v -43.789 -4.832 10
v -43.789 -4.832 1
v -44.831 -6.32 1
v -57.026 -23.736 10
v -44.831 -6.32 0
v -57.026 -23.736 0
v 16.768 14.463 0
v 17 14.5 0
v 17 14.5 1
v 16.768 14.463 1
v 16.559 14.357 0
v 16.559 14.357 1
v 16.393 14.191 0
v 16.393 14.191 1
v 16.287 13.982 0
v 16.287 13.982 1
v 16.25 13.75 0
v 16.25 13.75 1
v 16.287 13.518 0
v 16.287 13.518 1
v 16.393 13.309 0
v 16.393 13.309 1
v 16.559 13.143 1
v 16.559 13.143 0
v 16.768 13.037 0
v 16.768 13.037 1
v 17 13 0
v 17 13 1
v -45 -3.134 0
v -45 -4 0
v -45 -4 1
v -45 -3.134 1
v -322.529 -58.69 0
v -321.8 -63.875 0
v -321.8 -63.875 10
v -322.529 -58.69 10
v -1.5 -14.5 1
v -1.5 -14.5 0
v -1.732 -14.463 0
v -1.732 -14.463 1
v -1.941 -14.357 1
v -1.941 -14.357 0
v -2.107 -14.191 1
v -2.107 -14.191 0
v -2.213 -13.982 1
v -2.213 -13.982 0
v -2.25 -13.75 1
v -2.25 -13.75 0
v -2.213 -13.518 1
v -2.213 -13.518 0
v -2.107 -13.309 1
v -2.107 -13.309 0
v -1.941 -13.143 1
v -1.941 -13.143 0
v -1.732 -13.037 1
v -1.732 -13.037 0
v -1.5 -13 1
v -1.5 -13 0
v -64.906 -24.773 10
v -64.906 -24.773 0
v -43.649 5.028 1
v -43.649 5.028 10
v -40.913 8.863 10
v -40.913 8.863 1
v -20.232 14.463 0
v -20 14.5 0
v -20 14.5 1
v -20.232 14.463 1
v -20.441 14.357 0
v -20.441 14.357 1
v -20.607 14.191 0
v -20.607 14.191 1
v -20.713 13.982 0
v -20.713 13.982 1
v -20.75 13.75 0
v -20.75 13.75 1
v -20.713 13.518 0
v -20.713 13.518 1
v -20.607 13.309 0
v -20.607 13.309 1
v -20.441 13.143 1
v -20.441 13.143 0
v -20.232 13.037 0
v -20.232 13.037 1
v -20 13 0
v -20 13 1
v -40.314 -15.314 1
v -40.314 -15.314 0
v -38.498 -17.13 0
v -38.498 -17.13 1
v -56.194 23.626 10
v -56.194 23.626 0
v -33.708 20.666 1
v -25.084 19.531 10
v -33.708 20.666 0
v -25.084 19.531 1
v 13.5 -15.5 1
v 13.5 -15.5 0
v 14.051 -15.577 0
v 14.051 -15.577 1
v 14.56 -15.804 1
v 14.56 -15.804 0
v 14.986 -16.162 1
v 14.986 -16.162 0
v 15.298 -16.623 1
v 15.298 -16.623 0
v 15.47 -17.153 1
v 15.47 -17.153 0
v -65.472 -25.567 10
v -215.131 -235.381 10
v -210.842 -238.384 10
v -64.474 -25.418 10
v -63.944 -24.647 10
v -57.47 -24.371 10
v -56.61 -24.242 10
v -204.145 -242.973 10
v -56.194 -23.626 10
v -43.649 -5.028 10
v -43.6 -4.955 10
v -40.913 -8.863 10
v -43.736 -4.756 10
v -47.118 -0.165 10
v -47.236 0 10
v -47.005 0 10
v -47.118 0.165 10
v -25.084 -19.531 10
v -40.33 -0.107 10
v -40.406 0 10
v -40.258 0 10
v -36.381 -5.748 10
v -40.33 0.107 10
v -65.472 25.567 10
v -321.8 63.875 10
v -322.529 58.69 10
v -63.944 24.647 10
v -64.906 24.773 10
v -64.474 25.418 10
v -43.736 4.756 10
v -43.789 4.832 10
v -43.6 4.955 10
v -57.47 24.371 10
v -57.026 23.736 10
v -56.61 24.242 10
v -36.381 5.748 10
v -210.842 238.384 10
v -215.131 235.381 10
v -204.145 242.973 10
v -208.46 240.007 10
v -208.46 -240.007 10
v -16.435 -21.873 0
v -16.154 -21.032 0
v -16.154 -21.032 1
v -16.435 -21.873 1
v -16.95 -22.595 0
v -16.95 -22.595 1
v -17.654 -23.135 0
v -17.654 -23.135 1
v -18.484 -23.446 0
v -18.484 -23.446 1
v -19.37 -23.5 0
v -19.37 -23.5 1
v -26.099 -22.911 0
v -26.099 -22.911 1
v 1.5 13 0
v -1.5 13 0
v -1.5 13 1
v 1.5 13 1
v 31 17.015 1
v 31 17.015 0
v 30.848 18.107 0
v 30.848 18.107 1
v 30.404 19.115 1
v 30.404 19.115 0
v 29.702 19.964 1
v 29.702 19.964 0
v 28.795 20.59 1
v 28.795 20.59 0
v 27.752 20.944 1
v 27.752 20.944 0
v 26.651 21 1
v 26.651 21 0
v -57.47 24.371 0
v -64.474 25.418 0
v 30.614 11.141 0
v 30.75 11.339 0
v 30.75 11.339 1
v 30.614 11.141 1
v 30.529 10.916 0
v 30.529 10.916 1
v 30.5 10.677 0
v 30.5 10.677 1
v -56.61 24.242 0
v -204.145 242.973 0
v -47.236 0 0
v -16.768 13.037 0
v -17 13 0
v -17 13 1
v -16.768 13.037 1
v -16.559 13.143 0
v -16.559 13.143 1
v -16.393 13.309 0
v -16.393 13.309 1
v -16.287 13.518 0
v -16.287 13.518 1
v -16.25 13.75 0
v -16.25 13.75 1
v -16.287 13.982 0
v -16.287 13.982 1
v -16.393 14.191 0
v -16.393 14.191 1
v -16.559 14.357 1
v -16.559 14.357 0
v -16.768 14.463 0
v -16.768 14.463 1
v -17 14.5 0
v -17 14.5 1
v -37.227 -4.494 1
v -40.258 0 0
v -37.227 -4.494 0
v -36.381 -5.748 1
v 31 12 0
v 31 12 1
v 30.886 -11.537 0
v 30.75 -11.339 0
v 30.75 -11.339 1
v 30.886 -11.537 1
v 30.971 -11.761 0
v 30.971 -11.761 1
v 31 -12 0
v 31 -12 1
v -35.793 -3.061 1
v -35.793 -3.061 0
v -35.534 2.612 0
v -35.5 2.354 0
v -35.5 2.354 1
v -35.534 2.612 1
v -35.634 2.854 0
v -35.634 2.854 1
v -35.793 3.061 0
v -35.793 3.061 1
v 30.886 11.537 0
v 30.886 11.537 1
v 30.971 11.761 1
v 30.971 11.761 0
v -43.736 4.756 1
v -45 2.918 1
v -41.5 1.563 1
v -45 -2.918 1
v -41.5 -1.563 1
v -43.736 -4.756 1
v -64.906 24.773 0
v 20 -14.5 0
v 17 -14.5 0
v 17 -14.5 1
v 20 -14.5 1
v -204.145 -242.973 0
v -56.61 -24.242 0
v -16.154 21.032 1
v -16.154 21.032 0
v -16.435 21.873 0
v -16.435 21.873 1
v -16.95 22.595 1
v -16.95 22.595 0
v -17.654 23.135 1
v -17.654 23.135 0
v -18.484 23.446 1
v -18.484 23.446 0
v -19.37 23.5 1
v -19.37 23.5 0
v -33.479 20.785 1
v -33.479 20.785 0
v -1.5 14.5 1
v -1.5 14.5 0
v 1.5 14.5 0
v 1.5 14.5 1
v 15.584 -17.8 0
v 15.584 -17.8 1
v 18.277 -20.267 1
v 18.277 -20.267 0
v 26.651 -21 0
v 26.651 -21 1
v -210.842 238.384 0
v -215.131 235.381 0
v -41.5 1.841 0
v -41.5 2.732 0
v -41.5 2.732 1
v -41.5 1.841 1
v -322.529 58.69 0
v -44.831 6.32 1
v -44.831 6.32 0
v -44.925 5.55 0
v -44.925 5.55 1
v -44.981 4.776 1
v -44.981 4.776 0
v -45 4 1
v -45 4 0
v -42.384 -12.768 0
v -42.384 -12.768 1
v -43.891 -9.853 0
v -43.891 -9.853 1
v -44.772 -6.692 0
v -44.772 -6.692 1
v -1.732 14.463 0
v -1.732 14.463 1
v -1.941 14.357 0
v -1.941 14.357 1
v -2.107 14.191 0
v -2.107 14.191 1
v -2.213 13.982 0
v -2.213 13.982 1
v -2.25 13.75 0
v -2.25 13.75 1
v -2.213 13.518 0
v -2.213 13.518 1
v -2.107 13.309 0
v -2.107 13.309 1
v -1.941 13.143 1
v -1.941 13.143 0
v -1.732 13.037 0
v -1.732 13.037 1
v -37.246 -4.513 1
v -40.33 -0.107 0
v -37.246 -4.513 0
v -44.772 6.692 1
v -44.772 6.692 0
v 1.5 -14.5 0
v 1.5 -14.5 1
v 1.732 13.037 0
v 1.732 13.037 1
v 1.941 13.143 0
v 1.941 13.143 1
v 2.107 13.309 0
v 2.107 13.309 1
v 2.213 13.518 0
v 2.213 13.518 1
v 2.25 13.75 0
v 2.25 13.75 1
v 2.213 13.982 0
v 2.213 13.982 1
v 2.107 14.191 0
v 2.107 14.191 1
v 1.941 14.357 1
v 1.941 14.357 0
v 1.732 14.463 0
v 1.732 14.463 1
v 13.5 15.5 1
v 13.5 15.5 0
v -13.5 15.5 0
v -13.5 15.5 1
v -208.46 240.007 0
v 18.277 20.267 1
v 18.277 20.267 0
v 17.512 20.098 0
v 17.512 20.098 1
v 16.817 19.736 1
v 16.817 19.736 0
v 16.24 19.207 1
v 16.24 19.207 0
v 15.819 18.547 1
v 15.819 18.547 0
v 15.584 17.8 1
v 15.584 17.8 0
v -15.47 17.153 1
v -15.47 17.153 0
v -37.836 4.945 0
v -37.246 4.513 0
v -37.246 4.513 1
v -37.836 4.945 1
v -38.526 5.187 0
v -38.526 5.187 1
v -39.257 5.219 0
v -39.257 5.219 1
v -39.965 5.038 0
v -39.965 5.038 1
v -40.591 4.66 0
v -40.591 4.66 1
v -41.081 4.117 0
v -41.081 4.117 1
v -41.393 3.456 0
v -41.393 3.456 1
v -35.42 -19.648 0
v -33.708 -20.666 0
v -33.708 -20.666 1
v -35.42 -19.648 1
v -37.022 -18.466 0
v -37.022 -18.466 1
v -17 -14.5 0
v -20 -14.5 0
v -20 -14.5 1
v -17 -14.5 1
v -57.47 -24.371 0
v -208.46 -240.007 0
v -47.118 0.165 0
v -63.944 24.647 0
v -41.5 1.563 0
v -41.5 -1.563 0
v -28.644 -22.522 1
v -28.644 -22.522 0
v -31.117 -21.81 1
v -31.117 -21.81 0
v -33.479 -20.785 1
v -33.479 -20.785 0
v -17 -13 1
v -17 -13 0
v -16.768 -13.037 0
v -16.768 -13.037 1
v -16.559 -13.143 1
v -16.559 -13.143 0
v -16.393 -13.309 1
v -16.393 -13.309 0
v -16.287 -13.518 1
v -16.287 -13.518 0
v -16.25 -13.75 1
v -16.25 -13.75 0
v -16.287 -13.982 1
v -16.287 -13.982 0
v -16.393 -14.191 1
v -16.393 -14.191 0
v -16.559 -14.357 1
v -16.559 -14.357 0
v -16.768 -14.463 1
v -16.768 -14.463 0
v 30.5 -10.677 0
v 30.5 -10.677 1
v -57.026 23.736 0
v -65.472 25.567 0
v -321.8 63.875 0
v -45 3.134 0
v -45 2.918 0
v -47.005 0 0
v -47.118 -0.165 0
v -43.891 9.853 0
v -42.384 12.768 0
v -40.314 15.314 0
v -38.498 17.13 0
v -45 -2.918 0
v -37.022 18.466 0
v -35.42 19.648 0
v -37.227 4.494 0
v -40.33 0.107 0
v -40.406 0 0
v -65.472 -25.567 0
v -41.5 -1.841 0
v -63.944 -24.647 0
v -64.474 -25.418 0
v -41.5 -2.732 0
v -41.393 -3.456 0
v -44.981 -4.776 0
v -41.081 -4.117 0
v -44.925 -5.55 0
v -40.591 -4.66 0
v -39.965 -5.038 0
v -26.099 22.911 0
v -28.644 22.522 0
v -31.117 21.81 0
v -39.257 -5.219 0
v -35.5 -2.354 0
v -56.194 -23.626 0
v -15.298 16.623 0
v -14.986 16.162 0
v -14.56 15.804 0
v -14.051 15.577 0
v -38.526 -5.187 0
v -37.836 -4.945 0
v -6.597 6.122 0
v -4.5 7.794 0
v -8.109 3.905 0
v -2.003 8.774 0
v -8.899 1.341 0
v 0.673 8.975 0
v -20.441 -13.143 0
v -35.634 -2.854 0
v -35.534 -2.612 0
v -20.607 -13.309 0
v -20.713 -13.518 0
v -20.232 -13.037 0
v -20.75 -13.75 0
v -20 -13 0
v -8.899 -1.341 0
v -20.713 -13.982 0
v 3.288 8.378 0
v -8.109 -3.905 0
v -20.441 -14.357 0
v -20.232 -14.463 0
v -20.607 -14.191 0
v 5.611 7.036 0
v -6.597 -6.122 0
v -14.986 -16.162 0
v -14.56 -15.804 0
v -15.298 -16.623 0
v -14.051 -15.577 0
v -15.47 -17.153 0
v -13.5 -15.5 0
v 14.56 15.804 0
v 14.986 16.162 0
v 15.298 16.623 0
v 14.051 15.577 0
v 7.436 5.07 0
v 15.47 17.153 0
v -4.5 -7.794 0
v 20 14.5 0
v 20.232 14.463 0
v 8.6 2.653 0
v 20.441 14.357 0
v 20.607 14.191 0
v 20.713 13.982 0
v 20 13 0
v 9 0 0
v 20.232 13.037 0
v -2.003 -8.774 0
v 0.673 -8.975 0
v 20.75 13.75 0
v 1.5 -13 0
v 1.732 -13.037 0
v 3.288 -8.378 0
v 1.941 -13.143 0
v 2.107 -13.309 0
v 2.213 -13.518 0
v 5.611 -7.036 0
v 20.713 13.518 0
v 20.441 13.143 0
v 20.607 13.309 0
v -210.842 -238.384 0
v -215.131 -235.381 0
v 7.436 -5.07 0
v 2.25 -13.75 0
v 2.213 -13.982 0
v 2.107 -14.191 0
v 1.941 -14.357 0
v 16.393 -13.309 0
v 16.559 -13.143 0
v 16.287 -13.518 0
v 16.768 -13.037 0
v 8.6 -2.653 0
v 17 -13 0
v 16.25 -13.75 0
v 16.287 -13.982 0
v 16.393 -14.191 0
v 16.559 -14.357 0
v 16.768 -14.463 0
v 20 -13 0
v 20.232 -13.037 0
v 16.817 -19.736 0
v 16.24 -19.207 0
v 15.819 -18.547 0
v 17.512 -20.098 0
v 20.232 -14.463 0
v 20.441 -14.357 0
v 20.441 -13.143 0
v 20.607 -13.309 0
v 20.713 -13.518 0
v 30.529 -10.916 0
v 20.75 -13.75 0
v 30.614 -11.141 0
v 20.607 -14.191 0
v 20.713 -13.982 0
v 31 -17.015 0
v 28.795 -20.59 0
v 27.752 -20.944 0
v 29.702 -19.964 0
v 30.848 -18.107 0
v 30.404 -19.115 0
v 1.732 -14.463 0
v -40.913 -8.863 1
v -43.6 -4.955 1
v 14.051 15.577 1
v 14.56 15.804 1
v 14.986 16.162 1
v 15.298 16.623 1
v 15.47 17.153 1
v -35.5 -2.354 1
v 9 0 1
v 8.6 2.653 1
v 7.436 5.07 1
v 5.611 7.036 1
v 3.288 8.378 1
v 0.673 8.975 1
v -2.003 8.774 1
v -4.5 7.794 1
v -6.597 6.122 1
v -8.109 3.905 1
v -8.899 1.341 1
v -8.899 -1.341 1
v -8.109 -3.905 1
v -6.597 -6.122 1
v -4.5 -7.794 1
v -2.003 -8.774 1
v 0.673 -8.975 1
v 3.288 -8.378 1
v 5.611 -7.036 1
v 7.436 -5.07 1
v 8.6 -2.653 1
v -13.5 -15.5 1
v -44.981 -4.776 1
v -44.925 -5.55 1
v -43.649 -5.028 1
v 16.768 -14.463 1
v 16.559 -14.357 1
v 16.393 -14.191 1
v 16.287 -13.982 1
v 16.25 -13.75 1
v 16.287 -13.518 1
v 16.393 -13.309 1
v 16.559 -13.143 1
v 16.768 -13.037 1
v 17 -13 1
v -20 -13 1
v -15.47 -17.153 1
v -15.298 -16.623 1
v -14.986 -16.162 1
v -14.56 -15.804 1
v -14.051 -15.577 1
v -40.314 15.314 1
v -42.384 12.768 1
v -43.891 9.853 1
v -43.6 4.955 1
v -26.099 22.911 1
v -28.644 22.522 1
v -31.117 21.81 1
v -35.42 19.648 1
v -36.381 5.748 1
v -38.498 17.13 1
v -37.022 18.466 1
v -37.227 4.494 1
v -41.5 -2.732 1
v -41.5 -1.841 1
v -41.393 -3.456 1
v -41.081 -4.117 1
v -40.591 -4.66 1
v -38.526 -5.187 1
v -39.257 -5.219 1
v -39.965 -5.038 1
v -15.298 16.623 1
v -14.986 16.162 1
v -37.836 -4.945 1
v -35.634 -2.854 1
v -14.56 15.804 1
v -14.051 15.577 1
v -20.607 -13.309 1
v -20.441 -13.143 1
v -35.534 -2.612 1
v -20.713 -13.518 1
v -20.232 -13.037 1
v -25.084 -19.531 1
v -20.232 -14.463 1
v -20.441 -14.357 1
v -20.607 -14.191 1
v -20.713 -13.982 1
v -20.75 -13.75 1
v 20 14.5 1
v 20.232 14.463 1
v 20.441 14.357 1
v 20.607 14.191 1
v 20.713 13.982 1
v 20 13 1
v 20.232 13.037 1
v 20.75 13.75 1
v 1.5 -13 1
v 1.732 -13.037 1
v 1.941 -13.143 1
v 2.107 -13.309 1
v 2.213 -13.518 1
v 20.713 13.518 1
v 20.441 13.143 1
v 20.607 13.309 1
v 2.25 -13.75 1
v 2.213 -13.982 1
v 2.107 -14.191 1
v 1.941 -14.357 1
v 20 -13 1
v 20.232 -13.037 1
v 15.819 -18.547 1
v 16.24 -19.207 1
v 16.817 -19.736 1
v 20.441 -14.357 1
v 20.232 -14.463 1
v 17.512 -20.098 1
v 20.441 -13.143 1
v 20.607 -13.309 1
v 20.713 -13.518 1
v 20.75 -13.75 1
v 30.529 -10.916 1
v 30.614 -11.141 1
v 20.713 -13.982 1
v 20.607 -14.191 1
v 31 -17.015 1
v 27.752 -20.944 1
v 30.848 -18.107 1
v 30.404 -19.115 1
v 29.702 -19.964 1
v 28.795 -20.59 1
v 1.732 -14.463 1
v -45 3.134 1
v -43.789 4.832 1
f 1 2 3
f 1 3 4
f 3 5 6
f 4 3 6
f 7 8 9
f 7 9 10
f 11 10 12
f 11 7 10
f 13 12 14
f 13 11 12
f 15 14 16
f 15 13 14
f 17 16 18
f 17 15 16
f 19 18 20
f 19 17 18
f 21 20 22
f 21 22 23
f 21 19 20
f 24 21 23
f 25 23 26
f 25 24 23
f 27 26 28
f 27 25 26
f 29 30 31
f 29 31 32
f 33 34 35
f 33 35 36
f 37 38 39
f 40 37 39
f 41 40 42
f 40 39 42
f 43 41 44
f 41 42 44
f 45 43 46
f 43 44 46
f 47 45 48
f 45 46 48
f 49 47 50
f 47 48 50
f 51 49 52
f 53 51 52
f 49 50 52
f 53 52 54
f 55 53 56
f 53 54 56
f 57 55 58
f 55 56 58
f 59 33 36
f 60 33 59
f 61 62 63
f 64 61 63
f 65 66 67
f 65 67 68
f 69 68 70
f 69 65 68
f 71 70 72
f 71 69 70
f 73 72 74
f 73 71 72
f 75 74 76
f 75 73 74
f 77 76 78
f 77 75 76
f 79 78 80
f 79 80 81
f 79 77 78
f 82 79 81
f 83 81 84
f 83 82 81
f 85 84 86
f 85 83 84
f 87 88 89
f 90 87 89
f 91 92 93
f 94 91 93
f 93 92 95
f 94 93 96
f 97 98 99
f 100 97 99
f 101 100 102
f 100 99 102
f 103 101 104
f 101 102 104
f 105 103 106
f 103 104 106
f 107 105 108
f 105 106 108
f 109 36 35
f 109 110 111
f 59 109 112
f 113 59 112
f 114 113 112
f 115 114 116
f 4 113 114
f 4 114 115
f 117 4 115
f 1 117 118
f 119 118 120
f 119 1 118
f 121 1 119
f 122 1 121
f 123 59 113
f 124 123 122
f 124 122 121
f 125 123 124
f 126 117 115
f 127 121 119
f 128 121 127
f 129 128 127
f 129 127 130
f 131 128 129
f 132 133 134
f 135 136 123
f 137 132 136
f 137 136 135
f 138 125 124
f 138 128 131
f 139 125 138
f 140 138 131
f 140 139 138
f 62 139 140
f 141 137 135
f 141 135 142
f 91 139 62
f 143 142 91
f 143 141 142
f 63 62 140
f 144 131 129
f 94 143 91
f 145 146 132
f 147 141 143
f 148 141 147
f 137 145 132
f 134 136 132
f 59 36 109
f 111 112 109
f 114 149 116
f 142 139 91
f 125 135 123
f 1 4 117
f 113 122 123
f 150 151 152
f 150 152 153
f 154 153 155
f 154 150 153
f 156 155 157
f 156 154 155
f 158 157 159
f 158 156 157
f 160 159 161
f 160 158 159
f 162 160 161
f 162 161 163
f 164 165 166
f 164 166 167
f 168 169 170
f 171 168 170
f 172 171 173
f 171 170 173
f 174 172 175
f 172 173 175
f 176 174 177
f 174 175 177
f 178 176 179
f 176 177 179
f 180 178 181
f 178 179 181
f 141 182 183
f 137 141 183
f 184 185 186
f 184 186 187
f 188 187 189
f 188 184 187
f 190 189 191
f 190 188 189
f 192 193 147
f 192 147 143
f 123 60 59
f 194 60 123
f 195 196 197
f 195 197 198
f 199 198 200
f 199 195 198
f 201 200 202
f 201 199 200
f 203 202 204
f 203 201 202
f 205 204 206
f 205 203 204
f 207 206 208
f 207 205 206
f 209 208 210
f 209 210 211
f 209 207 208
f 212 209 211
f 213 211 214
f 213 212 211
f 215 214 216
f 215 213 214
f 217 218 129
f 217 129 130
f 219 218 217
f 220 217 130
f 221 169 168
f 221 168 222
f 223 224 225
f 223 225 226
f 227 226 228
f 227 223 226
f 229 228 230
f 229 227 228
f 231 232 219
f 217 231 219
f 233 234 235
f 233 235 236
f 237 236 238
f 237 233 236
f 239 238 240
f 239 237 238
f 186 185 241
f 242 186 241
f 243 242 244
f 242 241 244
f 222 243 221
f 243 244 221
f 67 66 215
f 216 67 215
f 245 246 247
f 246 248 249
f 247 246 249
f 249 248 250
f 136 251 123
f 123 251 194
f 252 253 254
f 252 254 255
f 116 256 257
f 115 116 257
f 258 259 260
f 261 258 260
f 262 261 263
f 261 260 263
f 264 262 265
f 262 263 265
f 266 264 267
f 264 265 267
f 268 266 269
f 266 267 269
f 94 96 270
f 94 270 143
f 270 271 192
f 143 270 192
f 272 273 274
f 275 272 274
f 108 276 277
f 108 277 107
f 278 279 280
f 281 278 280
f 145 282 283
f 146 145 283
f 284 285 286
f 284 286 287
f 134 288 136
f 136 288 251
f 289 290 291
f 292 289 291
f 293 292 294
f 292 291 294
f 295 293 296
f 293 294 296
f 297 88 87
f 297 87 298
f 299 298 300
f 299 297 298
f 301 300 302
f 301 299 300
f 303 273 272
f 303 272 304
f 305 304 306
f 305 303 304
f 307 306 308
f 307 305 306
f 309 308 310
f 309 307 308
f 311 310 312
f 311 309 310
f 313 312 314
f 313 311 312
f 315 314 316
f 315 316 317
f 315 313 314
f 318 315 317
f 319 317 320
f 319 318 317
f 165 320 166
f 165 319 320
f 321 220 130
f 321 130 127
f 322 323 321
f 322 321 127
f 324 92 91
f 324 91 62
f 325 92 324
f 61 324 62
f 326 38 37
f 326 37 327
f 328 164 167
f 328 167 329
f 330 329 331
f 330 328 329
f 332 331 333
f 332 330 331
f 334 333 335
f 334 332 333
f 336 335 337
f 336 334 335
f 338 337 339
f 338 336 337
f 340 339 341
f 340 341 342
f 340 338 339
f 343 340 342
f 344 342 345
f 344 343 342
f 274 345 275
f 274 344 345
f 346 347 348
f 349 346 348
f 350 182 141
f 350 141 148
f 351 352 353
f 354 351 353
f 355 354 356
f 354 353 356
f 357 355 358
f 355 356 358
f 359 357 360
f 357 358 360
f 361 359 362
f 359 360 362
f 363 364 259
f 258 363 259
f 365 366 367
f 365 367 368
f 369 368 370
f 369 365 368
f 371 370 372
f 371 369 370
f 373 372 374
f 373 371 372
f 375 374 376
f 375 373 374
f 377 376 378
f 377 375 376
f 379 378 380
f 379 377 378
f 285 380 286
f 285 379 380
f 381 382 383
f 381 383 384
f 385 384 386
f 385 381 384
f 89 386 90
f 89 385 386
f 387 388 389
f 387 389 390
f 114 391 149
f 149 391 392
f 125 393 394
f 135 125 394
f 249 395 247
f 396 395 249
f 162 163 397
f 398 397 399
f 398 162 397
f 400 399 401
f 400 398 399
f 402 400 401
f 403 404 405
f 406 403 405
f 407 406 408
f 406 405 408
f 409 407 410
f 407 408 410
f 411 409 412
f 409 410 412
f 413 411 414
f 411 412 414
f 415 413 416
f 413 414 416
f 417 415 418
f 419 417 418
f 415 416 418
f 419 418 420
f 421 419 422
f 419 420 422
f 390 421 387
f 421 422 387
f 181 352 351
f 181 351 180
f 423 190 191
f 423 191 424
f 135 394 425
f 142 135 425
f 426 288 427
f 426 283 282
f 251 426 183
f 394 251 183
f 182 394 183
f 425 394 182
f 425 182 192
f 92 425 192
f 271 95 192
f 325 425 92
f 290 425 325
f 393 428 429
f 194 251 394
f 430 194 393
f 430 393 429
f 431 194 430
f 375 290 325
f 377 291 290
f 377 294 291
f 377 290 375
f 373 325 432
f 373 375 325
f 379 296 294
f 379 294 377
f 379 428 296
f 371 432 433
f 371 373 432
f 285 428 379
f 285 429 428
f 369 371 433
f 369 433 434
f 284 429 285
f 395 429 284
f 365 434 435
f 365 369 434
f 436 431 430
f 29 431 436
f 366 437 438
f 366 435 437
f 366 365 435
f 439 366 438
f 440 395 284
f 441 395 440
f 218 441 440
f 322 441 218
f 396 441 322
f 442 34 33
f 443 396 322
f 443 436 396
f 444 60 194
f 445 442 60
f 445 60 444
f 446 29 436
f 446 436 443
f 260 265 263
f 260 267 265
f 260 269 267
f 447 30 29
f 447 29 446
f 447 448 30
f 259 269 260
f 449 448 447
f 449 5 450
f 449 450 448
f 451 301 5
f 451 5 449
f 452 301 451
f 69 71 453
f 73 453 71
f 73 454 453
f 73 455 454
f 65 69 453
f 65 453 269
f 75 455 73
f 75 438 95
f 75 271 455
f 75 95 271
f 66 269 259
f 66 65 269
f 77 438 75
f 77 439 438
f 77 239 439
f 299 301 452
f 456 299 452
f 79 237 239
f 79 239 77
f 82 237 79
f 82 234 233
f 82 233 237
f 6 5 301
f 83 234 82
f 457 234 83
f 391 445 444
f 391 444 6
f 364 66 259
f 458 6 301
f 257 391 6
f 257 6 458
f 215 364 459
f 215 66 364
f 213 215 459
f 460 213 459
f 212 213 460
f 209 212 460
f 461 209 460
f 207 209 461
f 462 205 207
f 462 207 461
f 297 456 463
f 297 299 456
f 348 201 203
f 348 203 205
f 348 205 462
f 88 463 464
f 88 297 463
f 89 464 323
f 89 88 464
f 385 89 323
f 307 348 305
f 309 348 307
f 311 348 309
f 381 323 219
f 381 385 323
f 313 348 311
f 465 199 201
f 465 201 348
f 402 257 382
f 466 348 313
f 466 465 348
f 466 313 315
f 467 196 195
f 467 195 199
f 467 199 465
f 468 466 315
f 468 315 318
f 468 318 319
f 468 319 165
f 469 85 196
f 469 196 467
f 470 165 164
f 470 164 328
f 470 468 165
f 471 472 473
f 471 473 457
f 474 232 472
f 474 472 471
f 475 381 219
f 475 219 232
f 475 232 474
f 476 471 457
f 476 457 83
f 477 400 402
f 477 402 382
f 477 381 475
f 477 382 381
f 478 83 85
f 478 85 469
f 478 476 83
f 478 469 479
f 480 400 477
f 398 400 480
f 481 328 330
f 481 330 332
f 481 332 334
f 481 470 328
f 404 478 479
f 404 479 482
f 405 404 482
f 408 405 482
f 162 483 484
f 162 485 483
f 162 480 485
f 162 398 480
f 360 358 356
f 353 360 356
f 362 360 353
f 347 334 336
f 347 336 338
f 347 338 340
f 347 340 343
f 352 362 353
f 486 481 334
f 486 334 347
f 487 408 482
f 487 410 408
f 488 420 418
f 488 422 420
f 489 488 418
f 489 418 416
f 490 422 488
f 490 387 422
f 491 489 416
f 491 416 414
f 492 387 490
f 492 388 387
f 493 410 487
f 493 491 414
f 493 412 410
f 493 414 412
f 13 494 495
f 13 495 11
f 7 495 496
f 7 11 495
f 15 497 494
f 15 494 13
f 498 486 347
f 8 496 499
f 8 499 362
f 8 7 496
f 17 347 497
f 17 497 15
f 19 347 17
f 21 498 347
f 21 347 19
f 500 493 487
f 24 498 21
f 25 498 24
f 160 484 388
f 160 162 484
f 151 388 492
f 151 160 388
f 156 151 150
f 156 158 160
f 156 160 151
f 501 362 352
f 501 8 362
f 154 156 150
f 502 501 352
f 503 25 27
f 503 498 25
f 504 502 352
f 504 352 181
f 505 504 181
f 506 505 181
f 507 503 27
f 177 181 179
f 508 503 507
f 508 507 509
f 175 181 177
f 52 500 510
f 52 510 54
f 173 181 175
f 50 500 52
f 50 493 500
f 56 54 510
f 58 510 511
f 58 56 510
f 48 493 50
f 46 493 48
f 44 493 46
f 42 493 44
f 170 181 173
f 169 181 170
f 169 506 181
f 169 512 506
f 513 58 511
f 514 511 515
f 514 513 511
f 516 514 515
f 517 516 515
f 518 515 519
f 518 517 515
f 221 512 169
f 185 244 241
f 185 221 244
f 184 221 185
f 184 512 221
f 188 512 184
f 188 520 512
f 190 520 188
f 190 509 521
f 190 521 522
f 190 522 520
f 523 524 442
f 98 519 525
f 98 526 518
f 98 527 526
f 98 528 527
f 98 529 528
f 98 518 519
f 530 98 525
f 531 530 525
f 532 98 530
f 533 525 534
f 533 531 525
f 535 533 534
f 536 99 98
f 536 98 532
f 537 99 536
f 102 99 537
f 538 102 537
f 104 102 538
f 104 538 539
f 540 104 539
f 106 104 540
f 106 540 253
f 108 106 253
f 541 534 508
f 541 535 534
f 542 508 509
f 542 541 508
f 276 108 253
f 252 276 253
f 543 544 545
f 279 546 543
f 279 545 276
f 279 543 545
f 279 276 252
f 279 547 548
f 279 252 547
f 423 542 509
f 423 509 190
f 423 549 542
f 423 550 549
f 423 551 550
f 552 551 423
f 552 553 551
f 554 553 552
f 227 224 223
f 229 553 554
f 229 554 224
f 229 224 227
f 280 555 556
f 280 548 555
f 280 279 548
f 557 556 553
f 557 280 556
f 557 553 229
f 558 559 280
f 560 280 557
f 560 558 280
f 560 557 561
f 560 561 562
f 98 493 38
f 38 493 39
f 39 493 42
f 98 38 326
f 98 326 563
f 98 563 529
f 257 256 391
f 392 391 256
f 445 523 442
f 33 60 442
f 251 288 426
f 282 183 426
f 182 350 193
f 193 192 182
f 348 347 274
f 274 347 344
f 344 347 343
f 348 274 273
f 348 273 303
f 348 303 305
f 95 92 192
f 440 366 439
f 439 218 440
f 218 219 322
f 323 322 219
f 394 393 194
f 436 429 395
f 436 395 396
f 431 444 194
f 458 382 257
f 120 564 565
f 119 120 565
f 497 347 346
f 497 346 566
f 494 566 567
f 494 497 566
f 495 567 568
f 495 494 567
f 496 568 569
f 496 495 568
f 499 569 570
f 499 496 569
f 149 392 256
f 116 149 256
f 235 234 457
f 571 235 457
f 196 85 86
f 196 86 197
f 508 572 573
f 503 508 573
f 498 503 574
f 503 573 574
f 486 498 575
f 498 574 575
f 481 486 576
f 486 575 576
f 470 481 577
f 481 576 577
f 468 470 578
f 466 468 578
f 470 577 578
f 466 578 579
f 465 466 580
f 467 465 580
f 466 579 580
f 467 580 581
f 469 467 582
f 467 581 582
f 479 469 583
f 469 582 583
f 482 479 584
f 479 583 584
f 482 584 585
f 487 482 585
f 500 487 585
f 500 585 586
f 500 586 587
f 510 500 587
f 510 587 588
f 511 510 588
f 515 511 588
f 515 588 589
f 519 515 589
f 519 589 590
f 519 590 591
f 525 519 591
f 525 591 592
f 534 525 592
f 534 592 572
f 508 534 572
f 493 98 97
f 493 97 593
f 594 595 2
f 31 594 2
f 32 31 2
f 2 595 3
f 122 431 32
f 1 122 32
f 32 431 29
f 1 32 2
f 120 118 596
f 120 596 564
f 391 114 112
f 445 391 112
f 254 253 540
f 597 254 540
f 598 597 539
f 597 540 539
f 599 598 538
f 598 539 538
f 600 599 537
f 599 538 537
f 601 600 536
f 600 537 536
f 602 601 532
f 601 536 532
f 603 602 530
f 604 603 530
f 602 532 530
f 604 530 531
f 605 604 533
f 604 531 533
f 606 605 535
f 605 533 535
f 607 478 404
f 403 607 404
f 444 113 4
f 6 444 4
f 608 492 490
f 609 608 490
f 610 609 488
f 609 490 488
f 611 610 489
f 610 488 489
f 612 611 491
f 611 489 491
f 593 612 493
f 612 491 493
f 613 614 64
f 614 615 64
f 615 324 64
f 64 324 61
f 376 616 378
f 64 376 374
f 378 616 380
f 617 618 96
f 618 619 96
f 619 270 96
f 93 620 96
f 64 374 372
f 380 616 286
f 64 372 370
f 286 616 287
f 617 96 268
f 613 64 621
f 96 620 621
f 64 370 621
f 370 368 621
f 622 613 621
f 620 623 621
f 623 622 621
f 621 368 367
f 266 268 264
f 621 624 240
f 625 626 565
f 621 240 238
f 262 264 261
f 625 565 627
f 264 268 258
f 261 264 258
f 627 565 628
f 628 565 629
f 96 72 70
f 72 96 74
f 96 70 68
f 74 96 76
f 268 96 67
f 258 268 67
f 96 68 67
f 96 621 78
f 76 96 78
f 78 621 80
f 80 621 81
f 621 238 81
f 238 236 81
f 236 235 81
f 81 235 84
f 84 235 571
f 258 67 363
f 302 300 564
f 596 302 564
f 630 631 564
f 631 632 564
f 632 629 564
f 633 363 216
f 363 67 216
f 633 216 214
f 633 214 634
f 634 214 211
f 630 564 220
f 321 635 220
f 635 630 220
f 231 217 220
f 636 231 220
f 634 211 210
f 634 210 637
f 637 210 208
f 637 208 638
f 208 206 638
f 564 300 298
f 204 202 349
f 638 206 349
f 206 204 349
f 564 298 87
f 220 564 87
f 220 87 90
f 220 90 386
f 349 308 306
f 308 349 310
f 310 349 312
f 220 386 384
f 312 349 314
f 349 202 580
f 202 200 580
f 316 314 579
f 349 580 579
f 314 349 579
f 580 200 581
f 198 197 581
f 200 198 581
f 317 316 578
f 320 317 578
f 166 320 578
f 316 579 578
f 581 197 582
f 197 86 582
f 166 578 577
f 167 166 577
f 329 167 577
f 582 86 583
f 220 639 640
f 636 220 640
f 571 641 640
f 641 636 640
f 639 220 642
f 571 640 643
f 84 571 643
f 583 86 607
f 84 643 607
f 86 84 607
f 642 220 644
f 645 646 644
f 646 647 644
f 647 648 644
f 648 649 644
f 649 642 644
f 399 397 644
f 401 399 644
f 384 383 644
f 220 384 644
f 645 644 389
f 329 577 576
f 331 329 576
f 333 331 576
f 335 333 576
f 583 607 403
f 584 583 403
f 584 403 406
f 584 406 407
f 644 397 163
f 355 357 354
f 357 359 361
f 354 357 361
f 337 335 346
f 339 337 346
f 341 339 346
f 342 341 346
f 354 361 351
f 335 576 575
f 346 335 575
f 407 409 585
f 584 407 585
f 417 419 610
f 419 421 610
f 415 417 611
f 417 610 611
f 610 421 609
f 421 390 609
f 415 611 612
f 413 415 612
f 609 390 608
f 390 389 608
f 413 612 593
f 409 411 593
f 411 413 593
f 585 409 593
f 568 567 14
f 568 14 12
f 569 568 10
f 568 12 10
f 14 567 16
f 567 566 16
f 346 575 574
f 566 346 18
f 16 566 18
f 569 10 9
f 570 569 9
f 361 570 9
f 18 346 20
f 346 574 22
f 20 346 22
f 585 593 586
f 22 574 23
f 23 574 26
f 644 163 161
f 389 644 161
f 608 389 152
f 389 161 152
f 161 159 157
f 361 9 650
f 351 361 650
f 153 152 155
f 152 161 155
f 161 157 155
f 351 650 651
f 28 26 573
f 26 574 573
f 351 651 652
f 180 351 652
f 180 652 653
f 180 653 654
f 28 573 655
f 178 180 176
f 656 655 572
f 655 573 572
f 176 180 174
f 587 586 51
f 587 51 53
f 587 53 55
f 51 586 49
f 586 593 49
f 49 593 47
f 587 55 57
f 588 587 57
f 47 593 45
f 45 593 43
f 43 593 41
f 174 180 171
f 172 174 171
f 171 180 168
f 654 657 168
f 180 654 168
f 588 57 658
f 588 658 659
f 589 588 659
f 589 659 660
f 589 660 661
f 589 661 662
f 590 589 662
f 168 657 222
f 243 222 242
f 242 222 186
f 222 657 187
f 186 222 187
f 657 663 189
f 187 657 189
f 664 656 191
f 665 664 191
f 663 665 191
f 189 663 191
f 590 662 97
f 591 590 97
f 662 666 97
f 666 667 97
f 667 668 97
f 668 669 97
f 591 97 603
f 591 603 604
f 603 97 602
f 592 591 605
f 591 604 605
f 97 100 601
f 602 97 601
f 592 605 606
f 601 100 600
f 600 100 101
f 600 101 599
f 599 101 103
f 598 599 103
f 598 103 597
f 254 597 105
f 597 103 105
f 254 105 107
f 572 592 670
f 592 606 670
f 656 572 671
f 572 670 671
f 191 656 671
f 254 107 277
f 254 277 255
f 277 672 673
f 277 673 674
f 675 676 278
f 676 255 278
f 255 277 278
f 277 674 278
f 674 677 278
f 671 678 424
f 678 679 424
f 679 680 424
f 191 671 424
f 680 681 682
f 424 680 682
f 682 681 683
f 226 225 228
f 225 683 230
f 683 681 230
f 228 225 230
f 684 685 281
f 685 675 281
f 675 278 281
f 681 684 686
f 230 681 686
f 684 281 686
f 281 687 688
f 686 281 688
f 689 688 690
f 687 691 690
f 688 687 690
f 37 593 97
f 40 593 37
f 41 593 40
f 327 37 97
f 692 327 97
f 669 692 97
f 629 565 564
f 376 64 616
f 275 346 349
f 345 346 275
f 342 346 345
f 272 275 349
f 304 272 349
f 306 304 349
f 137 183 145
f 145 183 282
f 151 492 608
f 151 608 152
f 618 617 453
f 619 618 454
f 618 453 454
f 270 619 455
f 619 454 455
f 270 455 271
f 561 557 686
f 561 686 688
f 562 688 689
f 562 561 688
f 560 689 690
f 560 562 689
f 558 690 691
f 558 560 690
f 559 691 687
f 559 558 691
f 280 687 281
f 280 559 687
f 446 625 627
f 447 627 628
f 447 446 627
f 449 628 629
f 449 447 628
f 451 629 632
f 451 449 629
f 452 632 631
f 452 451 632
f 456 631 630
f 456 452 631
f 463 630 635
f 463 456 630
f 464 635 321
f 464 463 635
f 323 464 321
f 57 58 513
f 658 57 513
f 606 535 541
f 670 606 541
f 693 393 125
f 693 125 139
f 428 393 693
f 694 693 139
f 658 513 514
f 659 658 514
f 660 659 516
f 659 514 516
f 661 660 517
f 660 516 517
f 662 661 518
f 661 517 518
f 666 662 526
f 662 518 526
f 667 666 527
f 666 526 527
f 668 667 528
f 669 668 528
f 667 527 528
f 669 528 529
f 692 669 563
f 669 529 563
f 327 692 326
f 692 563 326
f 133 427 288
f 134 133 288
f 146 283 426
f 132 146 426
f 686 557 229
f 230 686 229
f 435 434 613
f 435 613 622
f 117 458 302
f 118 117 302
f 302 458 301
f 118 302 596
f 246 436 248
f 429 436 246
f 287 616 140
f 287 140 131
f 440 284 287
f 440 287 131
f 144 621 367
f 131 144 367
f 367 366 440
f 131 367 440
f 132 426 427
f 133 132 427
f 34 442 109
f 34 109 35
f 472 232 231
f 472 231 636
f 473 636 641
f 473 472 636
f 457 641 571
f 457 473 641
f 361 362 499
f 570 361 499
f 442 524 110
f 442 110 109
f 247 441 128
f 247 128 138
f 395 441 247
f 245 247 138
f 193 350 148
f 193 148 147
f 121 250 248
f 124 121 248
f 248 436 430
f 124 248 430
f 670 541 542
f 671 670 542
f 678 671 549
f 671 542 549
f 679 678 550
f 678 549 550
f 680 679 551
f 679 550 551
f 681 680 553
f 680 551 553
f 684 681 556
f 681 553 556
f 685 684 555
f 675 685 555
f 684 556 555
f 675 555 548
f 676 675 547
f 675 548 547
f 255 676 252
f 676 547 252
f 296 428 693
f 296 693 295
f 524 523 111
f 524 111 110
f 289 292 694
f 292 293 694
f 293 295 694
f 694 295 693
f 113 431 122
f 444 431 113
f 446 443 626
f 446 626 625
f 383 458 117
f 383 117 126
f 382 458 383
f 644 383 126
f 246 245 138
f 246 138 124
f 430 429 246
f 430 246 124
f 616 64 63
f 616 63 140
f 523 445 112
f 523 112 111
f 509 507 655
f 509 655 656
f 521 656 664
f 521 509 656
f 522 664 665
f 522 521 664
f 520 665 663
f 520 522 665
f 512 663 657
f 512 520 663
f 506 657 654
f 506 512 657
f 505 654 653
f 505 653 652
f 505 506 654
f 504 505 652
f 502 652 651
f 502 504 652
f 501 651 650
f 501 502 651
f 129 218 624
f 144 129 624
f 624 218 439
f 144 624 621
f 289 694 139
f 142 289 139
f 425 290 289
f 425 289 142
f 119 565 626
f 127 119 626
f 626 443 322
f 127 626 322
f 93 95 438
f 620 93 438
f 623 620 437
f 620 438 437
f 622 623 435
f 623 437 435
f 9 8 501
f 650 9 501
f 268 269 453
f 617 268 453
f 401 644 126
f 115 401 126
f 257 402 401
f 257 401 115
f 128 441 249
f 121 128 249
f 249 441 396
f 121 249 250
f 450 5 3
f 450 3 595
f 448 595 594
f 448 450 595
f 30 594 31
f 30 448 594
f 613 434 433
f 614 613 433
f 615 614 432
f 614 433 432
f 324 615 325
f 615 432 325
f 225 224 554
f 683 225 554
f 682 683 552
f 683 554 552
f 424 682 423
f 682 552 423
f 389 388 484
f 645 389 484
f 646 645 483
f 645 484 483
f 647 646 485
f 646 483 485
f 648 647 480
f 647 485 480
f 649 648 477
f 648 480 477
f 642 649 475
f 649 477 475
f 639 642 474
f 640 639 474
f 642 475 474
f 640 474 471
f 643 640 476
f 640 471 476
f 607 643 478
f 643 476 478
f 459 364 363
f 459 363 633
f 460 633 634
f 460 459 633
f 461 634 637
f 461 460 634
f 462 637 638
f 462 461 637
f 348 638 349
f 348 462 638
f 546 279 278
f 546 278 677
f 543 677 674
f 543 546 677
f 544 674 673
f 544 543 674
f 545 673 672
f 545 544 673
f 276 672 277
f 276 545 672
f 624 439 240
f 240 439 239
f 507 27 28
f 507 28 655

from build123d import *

# Parameters (mm, degrees)
PAD_DEPTH       = 1
SKETCH012_R     = 9
POCKET_DEPTH    = 1.001
POCKET001_DEPTH = 1.001
PAD003_DEPTH    = 10


with BuildPart() as part:
    # Sketch007 → Pad (new body)
    with BuildSketch(Plane.XY):
        with BuildLine():
            Line((13.5, 15.5), (-13.5, 15.5))
            ThreePointArc((-15.469616, 17.152704), (-14.785575, 15.967911), (-13.5, 15.5))
            Line((-15.469616, 17.152704), (-16.153704, 21.03236))
            ThreePointArc((-16.153704, 21.03236), (-17.281843, 22.891476), (-19.369594, 23.5))
            Line((-19.369594, 23.5), (-26.098892, 22.911263))
            ThreePointArc((-26.098892, 22.911263), (-32.808142, 21.113525), (-38.497913, 17.129504))
            Line((-40.313708, 15.313708), (-38.497913, 17.129504))
            ThreePointArc((-40.313708, 15.313708), (-43.782073, 10.122935), (-45, 4))
            Line((-45, 4), (-45, 0))
            Line((-45, 0), (30.5, 0))
            Line((30.5, 0), (30.5, 10.677124))
            ThreePointArc((30.75, 11.338562), (30.564586, 11.030678), (30.5, 10.677124))
            ThreePointArc((30.75, 11.338562), (30.935414, 11.646447), (31, 12))
            Line((31, 17.015221), (31, 12))
            ThreePointArc((31, 17.015221), (29.702361, 19.964331), (26.651377, 21))
            Line((18.276649, 20.267306), (26.651377, 21))
            ThreePointArc((18.276649, 20.267306), (16.511345, 19.490554), (15.583693, 17.799667))
            Line((15.583693, 17.799667), (15.469616, 17.152704))
            ThreePointArc((13.5, 15.5), (14.785575, 15.967911), (15.469616, 17.152704))
        make_face()
        with BuildLine():
            Line((-20, 13), (-17, 13))
            ThreePointArc((-17, 13), (-16.25, 13.75), (-17, 14.5))
            Line((-20, 14.5), (-17, 14.5))
            ThreePointArc((-20, 14.5), (-20.75, 13.75), (-20, 13))
        make_face(mode=Mode.SUBTRACT)
        with BuildLine():
            Line((-1.5, 13), (1.5, 13))
            ThreePointArc((1.5, 13), (2.25, 13.75), (1.5, 14.5))
            Line((-1.5, 14.5), (1.5, 14.5))
            ThreePointArc((-1.5, 14.5), (-2.25, 13.75), (-1.5, 13))
        make_face(mode=Mode.SUBTRACT)
        with BuildLine():
            Line((17, 13), (20, 13))
            ThreePointArc((20, 13), (20.75, 13.75), (20, 14.5))
            Line((17, 14.5), (20, 14.5))
            ThreePointArc((17, 14.5), (16.25, 13.75), (17, 13))
        make_face(mode=Mode.SUBTRACT)
    pad = extrude(amount=PAD_DEPTH)

    # Mirrored: Pad across Sketch007 H_Axis
    add(pad.mirror(Plane.ZX))

    # Sketch012 (on Face5 of Mirrored) → Pocket (cut, through all)
    with BuildSketch(Plane.XY.offset(1)):
        Circle(SKETCH012_R)
    extrude(amount=-POCKET_DEPTH, mode=Mode.SUBTRACT)

    # Sketch008 → Pocket001 (cut, through all)
    with BuildSketch(Plane.XY):
        with BuildLine():
            Line((-41.5, 2.732233), (-41.5, -2.732233))
            ThreePointArc((-41.5, -2.732233), (-39.956709, -5.041932), (-37.232233, -4.5))
            Line((-35.792893, -3.06066), (-37.232233, -4.5))
            ThreePointArc((-35.792893, -3.06066), (-35.57612, -2.736237), (-35.5, -2.353553))
            Line((-35.5, 2.353553), (-35.5, -2.353553))
            ThreePointArc((-35.5, 2.353553), (-35.57612, 2.736237), (-35.792893, 3.06066))
            Line((-37.232233, 4.5), (-35.792893, 3.06066))
            ThreePointArc((-37.232233, 4.5), (-39.956709, 5.041932), (-41.5, 2.732233))
        make_face()
    extrude(amount=POCKET001_DEPTH, mode=Mode.SUBTRACT)

    # Sketch → Pad003 (join)
    with BuildSketch(Plane.XY):
        Polygon((-40.913498, 8.863434), (-210.841839, -238.383837), (-215.131018, -235.380521), align=None)
        Polygon((-36.380804, 5.7482), (-208.460287, -240.006771), (-204.145063, -242.972542), align=None)
        Polygon((-25.08387, 19.530617), (-321.799927, 63.875129), (-322.528654, 58.689966), align=None)
    pad003 = extrude(amount=PAD003_DEPTH)

    # Mirrored001: Pad003 across Sketch H_Axis
    add(pad003.mirror(Plane.ZX))


solid = part.part
